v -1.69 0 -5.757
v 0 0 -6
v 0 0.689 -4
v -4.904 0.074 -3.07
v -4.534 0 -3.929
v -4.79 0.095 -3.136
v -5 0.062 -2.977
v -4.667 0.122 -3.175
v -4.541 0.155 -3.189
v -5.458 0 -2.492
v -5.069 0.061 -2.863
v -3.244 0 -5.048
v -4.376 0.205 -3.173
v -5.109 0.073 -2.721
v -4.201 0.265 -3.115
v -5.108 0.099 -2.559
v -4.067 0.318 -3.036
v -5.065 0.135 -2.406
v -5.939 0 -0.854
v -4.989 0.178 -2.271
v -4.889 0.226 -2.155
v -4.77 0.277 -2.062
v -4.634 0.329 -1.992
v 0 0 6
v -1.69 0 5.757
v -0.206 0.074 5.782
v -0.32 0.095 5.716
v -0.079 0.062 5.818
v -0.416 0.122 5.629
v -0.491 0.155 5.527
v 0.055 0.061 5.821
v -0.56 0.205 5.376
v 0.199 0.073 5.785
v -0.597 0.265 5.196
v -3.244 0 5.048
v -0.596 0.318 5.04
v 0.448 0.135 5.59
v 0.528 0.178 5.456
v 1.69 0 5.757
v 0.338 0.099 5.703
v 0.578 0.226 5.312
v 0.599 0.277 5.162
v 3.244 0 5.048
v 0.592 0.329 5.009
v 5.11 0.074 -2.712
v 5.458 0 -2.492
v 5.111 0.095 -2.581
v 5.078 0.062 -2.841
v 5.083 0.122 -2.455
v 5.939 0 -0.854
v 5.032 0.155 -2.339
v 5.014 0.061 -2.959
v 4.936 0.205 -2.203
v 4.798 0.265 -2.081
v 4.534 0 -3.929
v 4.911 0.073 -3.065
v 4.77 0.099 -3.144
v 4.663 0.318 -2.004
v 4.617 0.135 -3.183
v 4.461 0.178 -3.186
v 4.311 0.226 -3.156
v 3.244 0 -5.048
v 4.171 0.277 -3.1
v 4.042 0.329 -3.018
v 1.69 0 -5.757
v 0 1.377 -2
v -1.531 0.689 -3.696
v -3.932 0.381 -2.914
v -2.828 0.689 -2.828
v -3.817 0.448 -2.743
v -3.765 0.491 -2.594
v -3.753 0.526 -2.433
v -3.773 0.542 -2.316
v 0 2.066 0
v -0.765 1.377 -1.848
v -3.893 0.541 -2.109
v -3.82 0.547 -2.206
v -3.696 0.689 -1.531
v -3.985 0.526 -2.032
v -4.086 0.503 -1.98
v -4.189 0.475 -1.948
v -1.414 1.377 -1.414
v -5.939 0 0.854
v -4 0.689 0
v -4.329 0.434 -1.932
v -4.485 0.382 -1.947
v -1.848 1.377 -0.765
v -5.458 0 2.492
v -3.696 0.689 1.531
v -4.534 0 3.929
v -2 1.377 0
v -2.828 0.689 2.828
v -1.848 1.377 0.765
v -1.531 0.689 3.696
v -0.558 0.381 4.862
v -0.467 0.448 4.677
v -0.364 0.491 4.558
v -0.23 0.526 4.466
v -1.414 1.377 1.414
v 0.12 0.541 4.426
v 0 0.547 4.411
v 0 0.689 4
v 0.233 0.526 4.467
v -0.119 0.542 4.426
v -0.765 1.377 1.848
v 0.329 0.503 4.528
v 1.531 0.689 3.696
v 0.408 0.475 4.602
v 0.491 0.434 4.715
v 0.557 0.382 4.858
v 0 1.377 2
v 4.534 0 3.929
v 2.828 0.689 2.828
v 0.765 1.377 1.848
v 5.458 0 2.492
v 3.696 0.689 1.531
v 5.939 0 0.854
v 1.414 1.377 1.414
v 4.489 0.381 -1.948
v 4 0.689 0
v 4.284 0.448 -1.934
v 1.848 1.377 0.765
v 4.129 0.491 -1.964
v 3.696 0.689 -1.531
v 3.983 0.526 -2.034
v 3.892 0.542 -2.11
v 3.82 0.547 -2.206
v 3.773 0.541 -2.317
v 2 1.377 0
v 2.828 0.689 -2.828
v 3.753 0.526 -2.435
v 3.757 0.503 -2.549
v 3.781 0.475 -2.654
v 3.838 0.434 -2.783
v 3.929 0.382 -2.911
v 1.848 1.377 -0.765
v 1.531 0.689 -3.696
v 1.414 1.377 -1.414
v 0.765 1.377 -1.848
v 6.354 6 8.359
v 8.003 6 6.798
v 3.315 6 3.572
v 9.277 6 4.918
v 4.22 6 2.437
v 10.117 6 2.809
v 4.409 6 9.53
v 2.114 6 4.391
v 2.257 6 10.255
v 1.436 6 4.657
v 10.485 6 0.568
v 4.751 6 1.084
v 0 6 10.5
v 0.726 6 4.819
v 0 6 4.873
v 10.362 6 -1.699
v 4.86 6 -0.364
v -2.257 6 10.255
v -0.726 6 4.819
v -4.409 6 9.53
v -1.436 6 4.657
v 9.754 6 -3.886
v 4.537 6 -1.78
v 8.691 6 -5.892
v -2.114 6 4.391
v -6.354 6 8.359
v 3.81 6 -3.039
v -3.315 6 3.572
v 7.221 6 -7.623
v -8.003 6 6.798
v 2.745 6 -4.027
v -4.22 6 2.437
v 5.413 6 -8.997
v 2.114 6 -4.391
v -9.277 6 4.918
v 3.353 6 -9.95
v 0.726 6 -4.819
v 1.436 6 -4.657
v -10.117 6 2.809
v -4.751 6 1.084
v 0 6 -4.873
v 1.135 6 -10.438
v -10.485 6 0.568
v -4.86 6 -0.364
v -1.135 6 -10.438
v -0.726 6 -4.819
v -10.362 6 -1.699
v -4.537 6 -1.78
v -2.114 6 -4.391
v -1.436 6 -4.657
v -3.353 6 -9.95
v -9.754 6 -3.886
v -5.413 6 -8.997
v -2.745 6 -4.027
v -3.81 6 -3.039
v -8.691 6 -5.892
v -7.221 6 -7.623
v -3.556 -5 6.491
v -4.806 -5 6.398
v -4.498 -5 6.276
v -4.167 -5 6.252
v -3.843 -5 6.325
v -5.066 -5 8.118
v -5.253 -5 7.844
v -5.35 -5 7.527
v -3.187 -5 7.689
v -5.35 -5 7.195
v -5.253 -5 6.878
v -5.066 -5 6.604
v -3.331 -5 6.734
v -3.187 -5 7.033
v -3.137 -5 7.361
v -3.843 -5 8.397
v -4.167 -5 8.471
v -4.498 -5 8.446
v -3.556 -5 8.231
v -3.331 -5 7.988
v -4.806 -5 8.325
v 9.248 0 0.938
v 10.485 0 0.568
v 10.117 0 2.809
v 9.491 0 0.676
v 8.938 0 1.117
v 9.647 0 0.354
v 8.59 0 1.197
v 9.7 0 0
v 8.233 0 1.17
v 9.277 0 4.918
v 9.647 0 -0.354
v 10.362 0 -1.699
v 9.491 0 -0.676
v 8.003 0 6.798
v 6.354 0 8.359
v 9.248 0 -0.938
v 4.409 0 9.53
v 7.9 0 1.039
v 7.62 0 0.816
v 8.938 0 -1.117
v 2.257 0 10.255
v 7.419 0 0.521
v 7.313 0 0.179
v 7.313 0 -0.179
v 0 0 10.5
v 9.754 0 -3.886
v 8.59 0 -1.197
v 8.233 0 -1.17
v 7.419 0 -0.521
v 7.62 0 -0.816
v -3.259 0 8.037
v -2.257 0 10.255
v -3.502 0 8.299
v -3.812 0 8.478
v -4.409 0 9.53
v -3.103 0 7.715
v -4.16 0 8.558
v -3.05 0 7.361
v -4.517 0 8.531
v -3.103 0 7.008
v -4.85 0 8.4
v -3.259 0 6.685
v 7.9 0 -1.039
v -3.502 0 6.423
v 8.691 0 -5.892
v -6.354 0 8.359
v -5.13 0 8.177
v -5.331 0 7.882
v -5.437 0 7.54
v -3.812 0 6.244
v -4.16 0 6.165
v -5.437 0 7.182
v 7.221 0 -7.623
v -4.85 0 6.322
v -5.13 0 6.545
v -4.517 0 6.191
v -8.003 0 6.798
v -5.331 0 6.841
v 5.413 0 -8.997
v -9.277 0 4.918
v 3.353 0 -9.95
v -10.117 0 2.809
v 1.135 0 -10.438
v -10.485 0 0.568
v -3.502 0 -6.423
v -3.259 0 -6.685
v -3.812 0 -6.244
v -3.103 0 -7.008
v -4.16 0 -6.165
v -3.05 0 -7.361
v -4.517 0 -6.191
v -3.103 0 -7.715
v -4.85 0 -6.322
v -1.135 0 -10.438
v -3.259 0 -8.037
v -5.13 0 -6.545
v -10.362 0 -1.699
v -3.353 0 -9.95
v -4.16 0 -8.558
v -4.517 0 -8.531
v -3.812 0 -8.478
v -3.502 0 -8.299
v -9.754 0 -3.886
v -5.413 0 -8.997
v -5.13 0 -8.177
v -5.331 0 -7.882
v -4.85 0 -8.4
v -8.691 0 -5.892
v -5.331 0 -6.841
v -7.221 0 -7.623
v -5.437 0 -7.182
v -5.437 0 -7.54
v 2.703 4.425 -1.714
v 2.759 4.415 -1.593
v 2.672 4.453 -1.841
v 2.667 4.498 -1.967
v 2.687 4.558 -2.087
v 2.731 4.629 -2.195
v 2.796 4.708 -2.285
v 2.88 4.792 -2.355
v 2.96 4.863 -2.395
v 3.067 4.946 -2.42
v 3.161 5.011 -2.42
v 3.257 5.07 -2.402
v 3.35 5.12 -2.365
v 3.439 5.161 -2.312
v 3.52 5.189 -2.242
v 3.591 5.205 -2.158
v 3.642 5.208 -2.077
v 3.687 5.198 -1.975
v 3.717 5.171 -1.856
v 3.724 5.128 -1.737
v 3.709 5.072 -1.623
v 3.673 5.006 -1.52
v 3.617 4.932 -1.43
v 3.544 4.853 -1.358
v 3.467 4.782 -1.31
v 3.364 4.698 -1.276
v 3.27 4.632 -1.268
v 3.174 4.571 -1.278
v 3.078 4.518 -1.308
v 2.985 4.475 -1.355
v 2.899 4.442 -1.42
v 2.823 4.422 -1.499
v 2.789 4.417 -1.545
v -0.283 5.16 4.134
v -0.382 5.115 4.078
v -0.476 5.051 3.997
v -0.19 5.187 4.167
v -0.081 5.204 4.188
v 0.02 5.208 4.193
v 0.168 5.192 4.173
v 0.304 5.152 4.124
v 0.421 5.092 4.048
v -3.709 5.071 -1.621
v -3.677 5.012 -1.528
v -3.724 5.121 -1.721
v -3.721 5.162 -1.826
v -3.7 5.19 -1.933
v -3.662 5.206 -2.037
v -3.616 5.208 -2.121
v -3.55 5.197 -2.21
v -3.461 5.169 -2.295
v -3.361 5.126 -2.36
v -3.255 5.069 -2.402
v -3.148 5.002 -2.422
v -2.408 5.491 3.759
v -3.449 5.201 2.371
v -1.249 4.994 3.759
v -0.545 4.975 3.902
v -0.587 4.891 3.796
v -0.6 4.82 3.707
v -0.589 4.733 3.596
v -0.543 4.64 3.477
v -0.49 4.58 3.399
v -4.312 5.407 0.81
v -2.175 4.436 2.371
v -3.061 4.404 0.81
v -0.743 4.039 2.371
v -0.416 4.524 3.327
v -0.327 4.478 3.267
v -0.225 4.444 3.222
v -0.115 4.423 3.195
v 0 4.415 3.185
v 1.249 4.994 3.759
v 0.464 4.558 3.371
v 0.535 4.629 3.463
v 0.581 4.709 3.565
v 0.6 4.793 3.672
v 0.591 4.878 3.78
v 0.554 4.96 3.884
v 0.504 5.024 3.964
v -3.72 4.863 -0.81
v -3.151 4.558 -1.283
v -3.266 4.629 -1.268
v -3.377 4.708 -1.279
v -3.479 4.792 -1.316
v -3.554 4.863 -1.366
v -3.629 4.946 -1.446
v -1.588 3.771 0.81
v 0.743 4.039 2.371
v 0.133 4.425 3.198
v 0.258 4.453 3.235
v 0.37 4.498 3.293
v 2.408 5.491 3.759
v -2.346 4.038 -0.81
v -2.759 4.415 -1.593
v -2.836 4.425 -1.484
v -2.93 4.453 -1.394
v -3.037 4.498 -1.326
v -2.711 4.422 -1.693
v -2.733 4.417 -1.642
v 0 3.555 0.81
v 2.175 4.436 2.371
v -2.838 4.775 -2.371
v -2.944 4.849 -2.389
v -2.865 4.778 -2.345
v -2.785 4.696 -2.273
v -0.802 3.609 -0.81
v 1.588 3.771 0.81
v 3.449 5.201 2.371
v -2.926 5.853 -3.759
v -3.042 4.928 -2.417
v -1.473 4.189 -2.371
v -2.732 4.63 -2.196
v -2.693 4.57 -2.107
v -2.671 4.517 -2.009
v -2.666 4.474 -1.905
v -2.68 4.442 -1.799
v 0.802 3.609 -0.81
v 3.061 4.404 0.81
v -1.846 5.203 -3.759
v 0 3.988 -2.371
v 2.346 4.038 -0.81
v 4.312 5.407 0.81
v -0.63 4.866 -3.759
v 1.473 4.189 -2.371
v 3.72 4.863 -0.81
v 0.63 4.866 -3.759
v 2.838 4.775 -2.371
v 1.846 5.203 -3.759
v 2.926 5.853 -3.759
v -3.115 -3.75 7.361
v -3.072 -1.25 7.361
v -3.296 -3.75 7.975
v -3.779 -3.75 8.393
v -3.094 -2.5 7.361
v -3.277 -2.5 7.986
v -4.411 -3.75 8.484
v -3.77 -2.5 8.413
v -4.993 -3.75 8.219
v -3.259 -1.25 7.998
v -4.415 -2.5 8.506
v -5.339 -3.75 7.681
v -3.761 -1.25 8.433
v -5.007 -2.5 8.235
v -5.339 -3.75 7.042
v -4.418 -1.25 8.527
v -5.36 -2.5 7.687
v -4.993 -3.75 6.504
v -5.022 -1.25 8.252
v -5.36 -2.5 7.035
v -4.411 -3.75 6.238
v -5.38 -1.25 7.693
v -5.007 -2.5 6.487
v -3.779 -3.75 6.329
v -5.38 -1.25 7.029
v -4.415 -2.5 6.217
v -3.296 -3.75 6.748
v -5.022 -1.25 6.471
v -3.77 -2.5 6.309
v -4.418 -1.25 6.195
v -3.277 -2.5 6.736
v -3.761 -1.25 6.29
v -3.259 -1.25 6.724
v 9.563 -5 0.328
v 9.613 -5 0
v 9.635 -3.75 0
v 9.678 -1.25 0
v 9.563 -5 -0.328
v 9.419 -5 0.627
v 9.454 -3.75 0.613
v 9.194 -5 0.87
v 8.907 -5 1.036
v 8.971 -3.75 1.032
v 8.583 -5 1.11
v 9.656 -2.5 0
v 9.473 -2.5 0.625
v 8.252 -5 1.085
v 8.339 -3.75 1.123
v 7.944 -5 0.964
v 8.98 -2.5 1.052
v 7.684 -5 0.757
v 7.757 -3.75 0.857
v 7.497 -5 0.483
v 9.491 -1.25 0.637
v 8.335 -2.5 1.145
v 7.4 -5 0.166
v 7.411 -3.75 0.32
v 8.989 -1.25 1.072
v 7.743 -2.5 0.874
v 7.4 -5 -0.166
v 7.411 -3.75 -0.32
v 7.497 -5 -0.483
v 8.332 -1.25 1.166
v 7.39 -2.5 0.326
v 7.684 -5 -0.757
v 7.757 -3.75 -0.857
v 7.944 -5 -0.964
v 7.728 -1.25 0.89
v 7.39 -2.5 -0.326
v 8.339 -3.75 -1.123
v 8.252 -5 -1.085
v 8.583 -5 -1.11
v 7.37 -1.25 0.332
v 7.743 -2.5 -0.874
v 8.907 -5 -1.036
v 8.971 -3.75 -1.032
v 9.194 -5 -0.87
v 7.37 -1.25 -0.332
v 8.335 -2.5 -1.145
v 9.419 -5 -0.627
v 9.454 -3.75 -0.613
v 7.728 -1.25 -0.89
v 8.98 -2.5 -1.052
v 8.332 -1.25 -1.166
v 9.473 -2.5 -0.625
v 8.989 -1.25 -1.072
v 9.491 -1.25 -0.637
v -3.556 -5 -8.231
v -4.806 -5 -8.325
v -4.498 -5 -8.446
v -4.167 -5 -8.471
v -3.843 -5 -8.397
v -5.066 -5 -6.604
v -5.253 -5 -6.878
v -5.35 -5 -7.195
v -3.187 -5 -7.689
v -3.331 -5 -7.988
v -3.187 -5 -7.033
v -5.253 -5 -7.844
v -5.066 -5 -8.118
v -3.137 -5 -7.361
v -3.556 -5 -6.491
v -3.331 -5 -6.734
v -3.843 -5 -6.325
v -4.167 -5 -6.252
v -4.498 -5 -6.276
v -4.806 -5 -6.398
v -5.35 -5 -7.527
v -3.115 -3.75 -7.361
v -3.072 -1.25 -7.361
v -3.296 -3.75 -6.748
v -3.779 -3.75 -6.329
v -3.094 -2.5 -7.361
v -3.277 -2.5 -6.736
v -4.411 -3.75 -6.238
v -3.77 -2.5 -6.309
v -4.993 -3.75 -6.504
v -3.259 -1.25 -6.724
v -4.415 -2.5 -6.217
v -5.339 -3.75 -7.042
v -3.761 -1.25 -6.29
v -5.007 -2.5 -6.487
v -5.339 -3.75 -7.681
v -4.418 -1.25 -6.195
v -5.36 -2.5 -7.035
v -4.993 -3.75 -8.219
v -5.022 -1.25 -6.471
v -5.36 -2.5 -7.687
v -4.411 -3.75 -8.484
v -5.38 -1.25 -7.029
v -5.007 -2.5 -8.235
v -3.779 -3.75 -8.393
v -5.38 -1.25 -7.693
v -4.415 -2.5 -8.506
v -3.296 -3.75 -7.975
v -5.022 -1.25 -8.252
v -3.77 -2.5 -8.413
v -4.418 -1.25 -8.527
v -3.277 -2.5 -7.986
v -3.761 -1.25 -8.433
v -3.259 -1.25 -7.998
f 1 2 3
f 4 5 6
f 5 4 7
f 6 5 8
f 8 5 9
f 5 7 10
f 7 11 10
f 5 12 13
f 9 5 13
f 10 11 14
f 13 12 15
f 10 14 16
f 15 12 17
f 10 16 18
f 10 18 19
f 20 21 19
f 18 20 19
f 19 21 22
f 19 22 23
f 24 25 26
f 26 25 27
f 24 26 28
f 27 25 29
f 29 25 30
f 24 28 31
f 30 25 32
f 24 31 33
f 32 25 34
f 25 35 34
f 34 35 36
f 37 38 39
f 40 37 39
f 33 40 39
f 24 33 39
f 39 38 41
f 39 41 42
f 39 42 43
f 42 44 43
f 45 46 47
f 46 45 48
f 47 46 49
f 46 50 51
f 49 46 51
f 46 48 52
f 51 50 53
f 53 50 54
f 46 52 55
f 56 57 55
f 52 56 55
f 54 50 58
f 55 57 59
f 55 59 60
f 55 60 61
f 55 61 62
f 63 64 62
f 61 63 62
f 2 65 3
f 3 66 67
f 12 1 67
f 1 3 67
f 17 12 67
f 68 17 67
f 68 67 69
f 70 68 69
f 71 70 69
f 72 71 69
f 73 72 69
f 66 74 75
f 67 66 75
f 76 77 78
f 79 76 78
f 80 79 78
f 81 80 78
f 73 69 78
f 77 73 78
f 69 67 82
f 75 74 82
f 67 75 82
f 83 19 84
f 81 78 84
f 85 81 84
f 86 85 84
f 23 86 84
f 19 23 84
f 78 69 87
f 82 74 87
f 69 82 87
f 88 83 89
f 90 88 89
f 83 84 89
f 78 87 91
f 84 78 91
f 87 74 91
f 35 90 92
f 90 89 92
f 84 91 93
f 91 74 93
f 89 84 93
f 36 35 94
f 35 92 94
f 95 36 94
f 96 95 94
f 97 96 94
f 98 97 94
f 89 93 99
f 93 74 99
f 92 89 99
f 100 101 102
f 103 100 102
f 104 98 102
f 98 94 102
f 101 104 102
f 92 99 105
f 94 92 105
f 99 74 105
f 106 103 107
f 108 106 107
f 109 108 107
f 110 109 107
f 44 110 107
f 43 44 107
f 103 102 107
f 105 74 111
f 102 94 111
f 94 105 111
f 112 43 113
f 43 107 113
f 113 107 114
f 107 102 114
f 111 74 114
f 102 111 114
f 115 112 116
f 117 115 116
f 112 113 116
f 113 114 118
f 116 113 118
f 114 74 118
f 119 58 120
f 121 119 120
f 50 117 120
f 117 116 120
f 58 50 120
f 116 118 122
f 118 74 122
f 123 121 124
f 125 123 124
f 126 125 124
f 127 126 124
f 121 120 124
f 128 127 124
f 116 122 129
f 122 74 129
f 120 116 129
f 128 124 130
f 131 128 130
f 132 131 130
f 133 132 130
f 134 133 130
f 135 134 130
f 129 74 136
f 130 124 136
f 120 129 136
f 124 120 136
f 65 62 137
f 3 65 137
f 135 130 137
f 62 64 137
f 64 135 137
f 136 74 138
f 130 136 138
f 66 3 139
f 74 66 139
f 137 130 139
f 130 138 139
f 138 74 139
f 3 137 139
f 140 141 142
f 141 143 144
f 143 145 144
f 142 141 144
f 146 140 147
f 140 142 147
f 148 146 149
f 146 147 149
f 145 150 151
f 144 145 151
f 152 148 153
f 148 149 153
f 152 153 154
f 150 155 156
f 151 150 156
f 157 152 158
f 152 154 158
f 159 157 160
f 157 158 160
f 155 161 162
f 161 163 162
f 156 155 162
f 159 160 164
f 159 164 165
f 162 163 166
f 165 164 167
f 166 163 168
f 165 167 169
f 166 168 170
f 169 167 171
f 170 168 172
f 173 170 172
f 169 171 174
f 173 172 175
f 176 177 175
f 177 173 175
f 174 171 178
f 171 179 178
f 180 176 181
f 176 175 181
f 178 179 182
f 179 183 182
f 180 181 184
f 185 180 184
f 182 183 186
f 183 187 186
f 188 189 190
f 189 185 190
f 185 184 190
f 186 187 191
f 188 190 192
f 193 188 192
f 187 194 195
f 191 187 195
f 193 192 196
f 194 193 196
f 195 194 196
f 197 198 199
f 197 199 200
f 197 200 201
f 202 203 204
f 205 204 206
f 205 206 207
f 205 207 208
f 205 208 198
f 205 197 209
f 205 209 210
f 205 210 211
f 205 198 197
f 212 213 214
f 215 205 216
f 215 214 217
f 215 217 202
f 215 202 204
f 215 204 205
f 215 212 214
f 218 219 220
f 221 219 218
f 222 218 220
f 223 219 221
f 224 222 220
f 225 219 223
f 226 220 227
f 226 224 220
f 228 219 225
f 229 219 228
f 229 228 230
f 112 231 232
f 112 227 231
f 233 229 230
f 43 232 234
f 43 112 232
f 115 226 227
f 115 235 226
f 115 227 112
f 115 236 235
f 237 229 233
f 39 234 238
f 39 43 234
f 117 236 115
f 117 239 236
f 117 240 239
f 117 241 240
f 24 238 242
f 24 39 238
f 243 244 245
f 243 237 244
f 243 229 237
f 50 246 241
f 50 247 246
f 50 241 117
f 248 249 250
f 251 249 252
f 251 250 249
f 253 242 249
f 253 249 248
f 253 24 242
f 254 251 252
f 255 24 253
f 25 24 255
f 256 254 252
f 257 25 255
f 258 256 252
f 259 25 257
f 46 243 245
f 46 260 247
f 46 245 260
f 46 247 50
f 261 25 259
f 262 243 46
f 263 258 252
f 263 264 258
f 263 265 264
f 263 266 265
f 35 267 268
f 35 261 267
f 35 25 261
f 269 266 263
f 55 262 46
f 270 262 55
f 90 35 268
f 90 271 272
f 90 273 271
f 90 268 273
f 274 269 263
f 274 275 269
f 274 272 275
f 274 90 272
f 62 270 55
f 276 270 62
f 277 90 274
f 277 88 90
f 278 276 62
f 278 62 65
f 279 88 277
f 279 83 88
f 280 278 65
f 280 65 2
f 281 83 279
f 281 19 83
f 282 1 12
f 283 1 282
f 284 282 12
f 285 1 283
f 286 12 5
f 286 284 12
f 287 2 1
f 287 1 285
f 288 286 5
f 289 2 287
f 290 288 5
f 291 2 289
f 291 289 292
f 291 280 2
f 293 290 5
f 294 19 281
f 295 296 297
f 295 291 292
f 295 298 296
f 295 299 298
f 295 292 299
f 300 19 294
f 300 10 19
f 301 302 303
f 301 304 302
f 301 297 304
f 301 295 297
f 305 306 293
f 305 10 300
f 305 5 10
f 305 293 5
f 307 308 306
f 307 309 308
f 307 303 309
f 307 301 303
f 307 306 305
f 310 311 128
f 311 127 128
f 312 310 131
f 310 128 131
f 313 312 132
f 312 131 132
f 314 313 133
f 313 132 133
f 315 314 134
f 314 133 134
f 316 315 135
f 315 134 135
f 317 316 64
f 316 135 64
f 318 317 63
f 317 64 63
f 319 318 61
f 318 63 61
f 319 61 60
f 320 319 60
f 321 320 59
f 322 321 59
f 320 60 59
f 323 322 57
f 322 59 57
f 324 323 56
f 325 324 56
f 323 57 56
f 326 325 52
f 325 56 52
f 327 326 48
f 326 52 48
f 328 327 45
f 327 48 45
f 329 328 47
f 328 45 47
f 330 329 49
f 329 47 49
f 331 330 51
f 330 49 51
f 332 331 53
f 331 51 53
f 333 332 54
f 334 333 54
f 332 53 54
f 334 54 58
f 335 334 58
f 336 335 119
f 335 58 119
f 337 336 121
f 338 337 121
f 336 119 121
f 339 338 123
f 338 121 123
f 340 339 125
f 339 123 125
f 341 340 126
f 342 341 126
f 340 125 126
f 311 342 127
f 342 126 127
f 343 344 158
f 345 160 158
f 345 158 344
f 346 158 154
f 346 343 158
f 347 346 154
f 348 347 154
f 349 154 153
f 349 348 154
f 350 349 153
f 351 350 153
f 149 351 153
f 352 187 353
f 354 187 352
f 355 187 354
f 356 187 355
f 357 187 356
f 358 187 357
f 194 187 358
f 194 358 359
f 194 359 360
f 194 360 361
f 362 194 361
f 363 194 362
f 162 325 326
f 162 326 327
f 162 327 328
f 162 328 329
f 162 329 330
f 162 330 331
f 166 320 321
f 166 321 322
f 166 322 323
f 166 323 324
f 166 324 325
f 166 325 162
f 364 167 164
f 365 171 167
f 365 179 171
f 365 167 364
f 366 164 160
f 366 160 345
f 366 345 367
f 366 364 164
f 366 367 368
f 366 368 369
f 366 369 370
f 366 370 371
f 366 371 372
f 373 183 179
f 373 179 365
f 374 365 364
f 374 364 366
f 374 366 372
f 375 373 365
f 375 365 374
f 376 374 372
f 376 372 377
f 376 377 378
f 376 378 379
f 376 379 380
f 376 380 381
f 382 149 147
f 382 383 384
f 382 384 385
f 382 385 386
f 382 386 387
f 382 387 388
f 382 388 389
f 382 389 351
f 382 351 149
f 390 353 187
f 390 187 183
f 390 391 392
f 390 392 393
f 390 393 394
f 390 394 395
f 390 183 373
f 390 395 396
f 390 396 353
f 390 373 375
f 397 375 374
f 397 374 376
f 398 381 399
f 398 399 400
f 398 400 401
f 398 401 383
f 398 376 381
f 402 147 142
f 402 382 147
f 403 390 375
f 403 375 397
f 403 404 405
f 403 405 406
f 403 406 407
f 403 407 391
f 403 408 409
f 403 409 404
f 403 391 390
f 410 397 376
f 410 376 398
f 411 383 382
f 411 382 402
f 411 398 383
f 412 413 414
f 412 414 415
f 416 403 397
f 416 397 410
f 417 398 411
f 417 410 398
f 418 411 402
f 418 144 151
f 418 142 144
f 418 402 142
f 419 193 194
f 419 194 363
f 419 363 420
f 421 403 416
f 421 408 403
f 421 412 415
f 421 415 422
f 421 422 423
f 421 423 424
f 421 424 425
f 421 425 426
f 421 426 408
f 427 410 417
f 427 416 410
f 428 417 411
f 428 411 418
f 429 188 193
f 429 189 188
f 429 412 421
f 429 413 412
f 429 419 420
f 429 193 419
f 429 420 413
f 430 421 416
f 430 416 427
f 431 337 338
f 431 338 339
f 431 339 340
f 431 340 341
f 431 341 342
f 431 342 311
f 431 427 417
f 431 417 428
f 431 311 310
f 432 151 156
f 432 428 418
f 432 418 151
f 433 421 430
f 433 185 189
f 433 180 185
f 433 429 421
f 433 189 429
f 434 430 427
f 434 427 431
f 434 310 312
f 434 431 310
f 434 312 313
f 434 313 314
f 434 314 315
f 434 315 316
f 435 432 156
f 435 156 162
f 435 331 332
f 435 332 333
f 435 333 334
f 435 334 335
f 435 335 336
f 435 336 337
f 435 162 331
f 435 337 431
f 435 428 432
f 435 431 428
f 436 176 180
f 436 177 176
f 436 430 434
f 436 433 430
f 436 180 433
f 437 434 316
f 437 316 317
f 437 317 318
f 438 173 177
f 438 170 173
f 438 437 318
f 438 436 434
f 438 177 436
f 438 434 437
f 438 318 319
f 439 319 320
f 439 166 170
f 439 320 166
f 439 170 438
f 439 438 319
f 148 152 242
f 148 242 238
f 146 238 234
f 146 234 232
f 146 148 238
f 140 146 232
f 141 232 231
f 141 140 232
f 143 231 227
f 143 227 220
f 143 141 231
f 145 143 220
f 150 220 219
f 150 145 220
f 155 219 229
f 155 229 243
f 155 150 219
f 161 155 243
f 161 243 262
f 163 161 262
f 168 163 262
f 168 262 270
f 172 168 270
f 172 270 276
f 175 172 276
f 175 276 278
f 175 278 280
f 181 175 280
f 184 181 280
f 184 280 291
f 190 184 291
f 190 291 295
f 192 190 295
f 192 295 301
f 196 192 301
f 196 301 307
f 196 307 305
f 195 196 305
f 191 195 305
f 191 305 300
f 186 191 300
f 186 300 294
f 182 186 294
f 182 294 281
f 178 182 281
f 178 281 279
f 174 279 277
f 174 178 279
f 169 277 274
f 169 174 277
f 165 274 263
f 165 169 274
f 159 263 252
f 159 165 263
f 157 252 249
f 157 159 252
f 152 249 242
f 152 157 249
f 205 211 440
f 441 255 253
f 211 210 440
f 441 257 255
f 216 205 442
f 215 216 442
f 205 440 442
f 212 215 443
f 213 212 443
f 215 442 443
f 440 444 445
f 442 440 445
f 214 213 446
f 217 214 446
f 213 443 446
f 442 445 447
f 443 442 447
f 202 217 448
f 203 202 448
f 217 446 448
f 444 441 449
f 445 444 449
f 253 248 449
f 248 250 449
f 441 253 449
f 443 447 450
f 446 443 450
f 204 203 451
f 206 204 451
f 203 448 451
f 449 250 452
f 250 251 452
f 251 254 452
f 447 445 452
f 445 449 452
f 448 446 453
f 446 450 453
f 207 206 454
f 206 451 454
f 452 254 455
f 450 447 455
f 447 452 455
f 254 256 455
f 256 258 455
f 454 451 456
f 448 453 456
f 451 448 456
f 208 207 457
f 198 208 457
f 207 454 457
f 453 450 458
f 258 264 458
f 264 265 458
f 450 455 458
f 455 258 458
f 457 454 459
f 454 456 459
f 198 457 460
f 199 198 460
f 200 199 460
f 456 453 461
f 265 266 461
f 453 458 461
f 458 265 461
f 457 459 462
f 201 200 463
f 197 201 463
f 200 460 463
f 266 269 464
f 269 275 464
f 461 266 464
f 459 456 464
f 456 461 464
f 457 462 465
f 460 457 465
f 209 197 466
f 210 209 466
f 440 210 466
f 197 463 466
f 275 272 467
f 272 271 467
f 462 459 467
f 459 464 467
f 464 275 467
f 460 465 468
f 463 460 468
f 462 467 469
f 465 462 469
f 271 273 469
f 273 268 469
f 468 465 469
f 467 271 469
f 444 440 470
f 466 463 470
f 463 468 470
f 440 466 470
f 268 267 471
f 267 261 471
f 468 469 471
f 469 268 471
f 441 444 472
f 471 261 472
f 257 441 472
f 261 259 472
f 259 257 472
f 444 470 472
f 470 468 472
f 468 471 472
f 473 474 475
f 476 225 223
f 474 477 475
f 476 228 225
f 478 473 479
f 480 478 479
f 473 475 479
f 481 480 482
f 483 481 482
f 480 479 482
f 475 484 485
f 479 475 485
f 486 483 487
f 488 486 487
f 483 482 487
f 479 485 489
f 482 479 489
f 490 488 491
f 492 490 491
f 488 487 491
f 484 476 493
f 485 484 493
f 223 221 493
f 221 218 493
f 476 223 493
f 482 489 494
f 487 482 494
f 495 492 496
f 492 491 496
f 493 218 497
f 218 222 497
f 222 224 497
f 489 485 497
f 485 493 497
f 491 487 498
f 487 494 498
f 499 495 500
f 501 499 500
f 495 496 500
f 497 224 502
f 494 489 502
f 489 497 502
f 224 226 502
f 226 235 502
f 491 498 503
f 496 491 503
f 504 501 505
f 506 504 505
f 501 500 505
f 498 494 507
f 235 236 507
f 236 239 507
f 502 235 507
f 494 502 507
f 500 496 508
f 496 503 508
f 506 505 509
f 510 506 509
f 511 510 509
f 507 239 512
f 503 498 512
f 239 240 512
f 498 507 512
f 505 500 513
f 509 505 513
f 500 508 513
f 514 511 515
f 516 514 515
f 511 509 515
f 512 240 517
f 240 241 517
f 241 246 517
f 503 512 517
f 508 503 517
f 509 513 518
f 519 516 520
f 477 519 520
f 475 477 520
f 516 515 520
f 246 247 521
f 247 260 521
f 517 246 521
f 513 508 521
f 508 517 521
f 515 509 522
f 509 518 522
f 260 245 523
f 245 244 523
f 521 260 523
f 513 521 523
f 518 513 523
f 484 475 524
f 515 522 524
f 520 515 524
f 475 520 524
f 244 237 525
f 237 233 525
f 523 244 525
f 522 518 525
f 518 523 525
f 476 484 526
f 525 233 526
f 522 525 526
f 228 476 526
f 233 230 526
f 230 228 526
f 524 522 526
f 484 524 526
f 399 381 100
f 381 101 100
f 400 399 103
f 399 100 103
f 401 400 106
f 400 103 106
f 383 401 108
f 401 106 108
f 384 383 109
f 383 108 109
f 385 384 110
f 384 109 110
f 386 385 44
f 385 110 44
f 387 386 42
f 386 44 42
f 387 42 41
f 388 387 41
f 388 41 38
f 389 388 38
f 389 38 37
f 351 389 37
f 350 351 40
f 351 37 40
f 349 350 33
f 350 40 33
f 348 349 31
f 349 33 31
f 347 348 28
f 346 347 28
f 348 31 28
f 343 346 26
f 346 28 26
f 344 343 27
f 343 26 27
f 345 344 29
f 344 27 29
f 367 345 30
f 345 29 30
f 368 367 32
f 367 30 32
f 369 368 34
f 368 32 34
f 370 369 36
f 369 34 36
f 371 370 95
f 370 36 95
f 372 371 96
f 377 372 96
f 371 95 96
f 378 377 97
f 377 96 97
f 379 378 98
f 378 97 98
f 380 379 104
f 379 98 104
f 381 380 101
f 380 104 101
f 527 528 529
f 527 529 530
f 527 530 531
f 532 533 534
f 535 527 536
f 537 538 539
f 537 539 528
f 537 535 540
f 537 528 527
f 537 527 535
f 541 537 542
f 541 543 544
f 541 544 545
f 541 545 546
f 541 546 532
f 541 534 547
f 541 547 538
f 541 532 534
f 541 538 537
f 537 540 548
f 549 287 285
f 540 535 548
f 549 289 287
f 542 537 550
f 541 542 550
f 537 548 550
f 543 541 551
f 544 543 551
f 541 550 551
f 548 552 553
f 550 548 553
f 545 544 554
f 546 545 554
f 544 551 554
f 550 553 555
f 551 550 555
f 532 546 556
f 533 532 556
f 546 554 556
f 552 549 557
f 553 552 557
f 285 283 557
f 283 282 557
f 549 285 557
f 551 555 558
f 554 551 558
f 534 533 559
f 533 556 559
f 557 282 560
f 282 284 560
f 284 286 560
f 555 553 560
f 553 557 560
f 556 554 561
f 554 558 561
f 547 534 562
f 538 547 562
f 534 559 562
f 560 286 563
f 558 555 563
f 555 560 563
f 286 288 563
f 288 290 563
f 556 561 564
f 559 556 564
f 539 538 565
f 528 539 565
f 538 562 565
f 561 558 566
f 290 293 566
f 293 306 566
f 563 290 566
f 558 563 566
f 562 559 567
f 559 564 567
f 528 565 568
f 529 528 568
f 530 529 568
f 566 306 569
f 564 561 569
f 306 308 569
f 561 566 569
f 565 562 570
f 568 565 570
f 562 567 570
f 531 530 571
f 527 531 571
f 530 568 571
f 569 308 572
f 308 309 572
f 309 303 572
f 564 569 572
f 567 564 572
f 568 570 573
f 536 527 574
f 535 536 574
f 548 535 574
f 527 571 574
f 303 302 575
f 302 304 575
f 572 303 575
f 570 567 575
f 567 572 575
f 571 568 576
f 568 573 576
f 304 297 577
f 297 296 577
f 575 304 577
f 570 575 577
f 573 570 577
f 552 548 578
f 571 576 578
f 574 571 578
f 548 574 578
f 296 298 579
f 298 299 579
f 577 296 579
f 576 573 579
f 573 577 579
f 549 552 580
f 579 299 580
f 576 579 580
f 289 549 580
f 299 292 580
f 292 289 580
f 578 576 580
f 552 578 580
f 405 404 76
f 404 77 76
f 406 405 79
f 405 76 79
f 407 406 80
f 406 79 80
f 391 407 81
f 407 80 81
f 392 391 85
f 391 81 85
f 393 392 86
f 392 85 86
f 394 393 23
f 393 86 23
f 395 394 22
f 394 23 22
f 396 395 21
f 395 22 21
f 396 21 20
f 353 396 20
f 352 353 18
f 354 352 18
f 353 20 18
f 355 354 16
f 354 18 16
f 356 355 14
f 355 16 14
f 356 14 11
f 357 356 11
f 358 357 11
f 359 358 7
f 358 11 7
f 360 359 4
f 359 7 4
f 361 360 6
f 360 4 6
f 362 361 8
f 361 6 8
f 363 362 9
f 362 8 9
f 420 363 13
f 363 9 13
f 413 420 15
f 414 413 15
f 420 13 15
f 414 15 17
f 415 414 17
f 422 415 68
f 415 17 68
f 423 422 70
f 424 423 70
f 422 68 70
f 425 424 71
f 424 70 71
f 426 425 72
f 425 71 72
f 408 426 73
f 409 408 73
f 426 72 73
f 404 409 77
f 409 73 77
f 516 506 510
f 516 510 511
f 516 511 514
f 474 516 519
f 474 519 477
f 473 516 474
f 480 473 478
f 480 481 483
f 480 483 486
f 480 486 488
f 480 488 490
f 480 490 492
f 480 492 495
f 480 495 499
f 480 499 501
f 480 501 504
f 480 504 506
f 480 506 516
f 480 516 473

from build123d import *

# Parameters (mm, degrees)
EXTRUDE_1_DEPTH           = 6
SKETCH_6_OUTSIDE_W        = 112.61
SKETCH_6_OUTSIDE_H        = 112.61
SKETCH_6_OUTSIDE_R        = 10.5
CUT_EXTRUDE_2_DEPTH       = 10
SKETCH_7_R                = 1.2
EXTRUDE_3_DEPTH           = 5
EXTRUDE_3_DRAFT           = 1
EXTRUDE_3_PROFILE_2_DEPTH = 5
EXTRUDE_3_PROFILE_2_DRAFT = 1
EXTRUDE_3_PROFILE_3_DEPTH = 5
EXTRUDE_3_PROFILE_3_DRAFT = 1
SWEEP_1_PROFILE_R         = 0.6
PATTERN_CIRCULAR_1_COUNT  = 3


with BuildPart() as part:
    # 草图1 → 凸台-拉伸1 (new body)
    with BuildSketch(Plane(origin=(0, 0, 0), x_dir=(1, 0, 0), z_dir=(0, 1, 0))):
        with BuildLine():
            Line((-28.1, 43.1), (28.1, 43.1))
            ThreePointArc((28.1, 43.1), (38.706601718, 38.706601718), (43.1, 28.1))
            Line((43.1, 28.1), (43.1, -28.1))
            ThreePointArc((43.1, -28.1), (38.706601718, -38.706601718), (28.1, -43.1))
            Line((28.1, -43.1), (-28.1, -43.1))
            ThreePointArc((-28.1, -43.1), (-38.706601718, -38.706601718), (-43.1, -28.1))
            Line((-43.1, -28.1), (-43.1, 28.1))
            ThreePointArc((-43.1, 28.1), (-38.706601718, 38.706601718), (-28.1, 43.1))
        make_face()
    extrude(amount=EXTRUDE_1_DEPTH)

    # 草图6 outside → 切除-拉伸2 (cut)
    with BuildSketch(Plane(origin=(0, 6, 0), x_dir=(1, 0, 0), z_dir=(0, 1, 0))):
        Rectangle(SKETCH_6_OUTSIDE_W, SKETCH_6_OUTSIDE_H)
        with Locations(Location((0, 0, 0), (0, 0, 270))):
            Circle(SKETCH_6_OUTSIDE_R, mode=Mode.SUBTRACT)
    extrude(amount=-CUT_EXTRUDE_2_DEPTH, mode=Mode.SUBTRACT)


with BuildPart() as extrude_3_tool:
    # 草图7 → 凸台-拉伸3 (with draft: the straight prism first)
    with BuildSketch(Plane.XZ):
        with Locations((8.5, 0)):
            Circle(SKETCH_7_R)
    extrude(amount=EXTRUDE_3_DEPTH)
    # 凸台-拉伸3: the draft: its side faces are tilted about the plane it starts from
    extrude_3_sides = [extrude_3_tool.faces().sort_by_distance(p)[0] for p in [
        (7.3, -2.5, 0),
    ]]
    draft(extrude_3_sides, Plane.XZ, EXTRUDE_3_DRAFT)


with BuildPart() as part_1:
    add(part.part)

    # 凸台-拉伸3: add extrude_3_tool
    add(extrude_3_tool.part)


with BuildPart() as extrude_3_profile_2_tool:
    # 草图7 → 凸台-拉伸3 profile 2 (with draft: the straight prism first)
    with BuildSketch(Plane.XZ):
        with Locations((-4.25, -7.361215932)):
            Circle(SKETCH_7_R)
    extrude(amount=EXTRUDE_3_PROFILE_2_DEPTH)
    # 凸台-拉伸3 profile 2: the draft: its side faces are tilted about the plane it starts from
    extrude_3_profile_2_sides = [extrude_3_profile_2_tool.faces().sort_by_distance(p)[0] for p in [
        (-5.45, -2.5, -7.361215932),
    ]]
    draft(extrude_3_profile_2_sides, Plane.XZ, EXTRUDE_3_PROFILE_2_DRAFT)


with BuildPart() as part_2:
    add(part_1.part)

    # 凸台-拉伸3 profile 2: add extrude_3_profile_2_tool
    add(extrude_3_profile_2_tool.part)


with BuildPart() as extrude_3_profile_3_tool:
    # 草图7 → 凸台-拉伸3 profile 3 (with draft: the straight prism first)
    with BuildSketch(Plane.XZ):
        with Locations((-4.25, 7.361215932)):
            Circle(SKETCH_7_R)
    extrude(amount=EXTRUDE_3_PROFILE_3_DEPTH)
    # 凸台-拉伸3 profile 3: the draft: its side faces are tilted about the plane it starts from
    extrude_3_profile_3_sides = [extrude_3_profile_3_tool.faces().sort_by_distance(p)[0] for p in [
        (-5.45, -2.5, 7.361215932),
    ]]
    draft(extrude_3_profile_3_sides, Plane.XZ, EXTRUDE_3_PROFILE_3_DRAFT)


with BuildPart() as part_3:
    add(part_2.part)

    # 凸台-拉伸3 profile 3: add extrude_3_profile_3_tool
    add(extrude_3_profile_3_tool.part)

    # 草图8 → 切除-旋转1 (revolve, cut)
    with BuildSketch(Plane(origin=(0, 9.5, 0), x_dir=(1, 0, 0), z_dir=(0, 1, 0))):
        with BuildLine():
            Line((0, 6), (0, -6))
            ThreePointArc((0, -6), (-6, 0), (0, 6))
        make_face()
    revolve(axis=Axis((0, 9.5, -6), (0, 0, 1)), mode=Mode.SUBTRACT)

    # 切除-拉伸3 cone 1 section (through the dimple's axis) → 切除-拉伸3 (revolve, cut)
    with BuildSketch(Plane(origin=(0, 0, 0), x_dir=(0, 0, -1), z_dir=(1, 0, 0))):
        Polygon((0, 0), (6, 0), (0, 2.06596568), align=None)
    revolve(axis=Axis((0, 0, 0), (0, 1, 0)), mode=Mode.SUBTRACT)

    # 切除-扫描1: sweep along a path in 草图12
    with BuildLine(Plane(origin=(0, 0, 0), x_dir=(0, 0, -1), z_dir=(1, 0, 0))) as sweep_1_path:
        Line((-3.177240677, 6.426747641), (-5.652840705, -1.383969025))
    # 切除-扫描1 profile (on start of the path) → 切除-扫描1 (sweep, cut)
    with BuildSketch(Plane(origin=(0, 6.426747641, 3.177240677), x_dir=(0, -0.30213643640779364, -0.9532646924096158), z_dir=(0, -0.9532646924096158, 0.30213643640779364))):
        Circle(SWEEP_1_PROFILE_R)
    sweep_1 = sweep(path=sweep_1_path.line, mode=Mode.SUBTRACT)

    # 阵列(圆周)1: 切除-扫描1 ×3 about axis
    pattern_circular_1_axis = Axis((0, 6, 0), (0, 1, 0))
    for i in range(1, PATTERN_CIRCULAR_1_COUNT):
        add(sweep_1.rotate(pattern_circular_1_axis, i * 360 / PATTERN_CIRCULAR_1_COUNT), mode=Mode.SUBTRACT)


solid = part_3.part
